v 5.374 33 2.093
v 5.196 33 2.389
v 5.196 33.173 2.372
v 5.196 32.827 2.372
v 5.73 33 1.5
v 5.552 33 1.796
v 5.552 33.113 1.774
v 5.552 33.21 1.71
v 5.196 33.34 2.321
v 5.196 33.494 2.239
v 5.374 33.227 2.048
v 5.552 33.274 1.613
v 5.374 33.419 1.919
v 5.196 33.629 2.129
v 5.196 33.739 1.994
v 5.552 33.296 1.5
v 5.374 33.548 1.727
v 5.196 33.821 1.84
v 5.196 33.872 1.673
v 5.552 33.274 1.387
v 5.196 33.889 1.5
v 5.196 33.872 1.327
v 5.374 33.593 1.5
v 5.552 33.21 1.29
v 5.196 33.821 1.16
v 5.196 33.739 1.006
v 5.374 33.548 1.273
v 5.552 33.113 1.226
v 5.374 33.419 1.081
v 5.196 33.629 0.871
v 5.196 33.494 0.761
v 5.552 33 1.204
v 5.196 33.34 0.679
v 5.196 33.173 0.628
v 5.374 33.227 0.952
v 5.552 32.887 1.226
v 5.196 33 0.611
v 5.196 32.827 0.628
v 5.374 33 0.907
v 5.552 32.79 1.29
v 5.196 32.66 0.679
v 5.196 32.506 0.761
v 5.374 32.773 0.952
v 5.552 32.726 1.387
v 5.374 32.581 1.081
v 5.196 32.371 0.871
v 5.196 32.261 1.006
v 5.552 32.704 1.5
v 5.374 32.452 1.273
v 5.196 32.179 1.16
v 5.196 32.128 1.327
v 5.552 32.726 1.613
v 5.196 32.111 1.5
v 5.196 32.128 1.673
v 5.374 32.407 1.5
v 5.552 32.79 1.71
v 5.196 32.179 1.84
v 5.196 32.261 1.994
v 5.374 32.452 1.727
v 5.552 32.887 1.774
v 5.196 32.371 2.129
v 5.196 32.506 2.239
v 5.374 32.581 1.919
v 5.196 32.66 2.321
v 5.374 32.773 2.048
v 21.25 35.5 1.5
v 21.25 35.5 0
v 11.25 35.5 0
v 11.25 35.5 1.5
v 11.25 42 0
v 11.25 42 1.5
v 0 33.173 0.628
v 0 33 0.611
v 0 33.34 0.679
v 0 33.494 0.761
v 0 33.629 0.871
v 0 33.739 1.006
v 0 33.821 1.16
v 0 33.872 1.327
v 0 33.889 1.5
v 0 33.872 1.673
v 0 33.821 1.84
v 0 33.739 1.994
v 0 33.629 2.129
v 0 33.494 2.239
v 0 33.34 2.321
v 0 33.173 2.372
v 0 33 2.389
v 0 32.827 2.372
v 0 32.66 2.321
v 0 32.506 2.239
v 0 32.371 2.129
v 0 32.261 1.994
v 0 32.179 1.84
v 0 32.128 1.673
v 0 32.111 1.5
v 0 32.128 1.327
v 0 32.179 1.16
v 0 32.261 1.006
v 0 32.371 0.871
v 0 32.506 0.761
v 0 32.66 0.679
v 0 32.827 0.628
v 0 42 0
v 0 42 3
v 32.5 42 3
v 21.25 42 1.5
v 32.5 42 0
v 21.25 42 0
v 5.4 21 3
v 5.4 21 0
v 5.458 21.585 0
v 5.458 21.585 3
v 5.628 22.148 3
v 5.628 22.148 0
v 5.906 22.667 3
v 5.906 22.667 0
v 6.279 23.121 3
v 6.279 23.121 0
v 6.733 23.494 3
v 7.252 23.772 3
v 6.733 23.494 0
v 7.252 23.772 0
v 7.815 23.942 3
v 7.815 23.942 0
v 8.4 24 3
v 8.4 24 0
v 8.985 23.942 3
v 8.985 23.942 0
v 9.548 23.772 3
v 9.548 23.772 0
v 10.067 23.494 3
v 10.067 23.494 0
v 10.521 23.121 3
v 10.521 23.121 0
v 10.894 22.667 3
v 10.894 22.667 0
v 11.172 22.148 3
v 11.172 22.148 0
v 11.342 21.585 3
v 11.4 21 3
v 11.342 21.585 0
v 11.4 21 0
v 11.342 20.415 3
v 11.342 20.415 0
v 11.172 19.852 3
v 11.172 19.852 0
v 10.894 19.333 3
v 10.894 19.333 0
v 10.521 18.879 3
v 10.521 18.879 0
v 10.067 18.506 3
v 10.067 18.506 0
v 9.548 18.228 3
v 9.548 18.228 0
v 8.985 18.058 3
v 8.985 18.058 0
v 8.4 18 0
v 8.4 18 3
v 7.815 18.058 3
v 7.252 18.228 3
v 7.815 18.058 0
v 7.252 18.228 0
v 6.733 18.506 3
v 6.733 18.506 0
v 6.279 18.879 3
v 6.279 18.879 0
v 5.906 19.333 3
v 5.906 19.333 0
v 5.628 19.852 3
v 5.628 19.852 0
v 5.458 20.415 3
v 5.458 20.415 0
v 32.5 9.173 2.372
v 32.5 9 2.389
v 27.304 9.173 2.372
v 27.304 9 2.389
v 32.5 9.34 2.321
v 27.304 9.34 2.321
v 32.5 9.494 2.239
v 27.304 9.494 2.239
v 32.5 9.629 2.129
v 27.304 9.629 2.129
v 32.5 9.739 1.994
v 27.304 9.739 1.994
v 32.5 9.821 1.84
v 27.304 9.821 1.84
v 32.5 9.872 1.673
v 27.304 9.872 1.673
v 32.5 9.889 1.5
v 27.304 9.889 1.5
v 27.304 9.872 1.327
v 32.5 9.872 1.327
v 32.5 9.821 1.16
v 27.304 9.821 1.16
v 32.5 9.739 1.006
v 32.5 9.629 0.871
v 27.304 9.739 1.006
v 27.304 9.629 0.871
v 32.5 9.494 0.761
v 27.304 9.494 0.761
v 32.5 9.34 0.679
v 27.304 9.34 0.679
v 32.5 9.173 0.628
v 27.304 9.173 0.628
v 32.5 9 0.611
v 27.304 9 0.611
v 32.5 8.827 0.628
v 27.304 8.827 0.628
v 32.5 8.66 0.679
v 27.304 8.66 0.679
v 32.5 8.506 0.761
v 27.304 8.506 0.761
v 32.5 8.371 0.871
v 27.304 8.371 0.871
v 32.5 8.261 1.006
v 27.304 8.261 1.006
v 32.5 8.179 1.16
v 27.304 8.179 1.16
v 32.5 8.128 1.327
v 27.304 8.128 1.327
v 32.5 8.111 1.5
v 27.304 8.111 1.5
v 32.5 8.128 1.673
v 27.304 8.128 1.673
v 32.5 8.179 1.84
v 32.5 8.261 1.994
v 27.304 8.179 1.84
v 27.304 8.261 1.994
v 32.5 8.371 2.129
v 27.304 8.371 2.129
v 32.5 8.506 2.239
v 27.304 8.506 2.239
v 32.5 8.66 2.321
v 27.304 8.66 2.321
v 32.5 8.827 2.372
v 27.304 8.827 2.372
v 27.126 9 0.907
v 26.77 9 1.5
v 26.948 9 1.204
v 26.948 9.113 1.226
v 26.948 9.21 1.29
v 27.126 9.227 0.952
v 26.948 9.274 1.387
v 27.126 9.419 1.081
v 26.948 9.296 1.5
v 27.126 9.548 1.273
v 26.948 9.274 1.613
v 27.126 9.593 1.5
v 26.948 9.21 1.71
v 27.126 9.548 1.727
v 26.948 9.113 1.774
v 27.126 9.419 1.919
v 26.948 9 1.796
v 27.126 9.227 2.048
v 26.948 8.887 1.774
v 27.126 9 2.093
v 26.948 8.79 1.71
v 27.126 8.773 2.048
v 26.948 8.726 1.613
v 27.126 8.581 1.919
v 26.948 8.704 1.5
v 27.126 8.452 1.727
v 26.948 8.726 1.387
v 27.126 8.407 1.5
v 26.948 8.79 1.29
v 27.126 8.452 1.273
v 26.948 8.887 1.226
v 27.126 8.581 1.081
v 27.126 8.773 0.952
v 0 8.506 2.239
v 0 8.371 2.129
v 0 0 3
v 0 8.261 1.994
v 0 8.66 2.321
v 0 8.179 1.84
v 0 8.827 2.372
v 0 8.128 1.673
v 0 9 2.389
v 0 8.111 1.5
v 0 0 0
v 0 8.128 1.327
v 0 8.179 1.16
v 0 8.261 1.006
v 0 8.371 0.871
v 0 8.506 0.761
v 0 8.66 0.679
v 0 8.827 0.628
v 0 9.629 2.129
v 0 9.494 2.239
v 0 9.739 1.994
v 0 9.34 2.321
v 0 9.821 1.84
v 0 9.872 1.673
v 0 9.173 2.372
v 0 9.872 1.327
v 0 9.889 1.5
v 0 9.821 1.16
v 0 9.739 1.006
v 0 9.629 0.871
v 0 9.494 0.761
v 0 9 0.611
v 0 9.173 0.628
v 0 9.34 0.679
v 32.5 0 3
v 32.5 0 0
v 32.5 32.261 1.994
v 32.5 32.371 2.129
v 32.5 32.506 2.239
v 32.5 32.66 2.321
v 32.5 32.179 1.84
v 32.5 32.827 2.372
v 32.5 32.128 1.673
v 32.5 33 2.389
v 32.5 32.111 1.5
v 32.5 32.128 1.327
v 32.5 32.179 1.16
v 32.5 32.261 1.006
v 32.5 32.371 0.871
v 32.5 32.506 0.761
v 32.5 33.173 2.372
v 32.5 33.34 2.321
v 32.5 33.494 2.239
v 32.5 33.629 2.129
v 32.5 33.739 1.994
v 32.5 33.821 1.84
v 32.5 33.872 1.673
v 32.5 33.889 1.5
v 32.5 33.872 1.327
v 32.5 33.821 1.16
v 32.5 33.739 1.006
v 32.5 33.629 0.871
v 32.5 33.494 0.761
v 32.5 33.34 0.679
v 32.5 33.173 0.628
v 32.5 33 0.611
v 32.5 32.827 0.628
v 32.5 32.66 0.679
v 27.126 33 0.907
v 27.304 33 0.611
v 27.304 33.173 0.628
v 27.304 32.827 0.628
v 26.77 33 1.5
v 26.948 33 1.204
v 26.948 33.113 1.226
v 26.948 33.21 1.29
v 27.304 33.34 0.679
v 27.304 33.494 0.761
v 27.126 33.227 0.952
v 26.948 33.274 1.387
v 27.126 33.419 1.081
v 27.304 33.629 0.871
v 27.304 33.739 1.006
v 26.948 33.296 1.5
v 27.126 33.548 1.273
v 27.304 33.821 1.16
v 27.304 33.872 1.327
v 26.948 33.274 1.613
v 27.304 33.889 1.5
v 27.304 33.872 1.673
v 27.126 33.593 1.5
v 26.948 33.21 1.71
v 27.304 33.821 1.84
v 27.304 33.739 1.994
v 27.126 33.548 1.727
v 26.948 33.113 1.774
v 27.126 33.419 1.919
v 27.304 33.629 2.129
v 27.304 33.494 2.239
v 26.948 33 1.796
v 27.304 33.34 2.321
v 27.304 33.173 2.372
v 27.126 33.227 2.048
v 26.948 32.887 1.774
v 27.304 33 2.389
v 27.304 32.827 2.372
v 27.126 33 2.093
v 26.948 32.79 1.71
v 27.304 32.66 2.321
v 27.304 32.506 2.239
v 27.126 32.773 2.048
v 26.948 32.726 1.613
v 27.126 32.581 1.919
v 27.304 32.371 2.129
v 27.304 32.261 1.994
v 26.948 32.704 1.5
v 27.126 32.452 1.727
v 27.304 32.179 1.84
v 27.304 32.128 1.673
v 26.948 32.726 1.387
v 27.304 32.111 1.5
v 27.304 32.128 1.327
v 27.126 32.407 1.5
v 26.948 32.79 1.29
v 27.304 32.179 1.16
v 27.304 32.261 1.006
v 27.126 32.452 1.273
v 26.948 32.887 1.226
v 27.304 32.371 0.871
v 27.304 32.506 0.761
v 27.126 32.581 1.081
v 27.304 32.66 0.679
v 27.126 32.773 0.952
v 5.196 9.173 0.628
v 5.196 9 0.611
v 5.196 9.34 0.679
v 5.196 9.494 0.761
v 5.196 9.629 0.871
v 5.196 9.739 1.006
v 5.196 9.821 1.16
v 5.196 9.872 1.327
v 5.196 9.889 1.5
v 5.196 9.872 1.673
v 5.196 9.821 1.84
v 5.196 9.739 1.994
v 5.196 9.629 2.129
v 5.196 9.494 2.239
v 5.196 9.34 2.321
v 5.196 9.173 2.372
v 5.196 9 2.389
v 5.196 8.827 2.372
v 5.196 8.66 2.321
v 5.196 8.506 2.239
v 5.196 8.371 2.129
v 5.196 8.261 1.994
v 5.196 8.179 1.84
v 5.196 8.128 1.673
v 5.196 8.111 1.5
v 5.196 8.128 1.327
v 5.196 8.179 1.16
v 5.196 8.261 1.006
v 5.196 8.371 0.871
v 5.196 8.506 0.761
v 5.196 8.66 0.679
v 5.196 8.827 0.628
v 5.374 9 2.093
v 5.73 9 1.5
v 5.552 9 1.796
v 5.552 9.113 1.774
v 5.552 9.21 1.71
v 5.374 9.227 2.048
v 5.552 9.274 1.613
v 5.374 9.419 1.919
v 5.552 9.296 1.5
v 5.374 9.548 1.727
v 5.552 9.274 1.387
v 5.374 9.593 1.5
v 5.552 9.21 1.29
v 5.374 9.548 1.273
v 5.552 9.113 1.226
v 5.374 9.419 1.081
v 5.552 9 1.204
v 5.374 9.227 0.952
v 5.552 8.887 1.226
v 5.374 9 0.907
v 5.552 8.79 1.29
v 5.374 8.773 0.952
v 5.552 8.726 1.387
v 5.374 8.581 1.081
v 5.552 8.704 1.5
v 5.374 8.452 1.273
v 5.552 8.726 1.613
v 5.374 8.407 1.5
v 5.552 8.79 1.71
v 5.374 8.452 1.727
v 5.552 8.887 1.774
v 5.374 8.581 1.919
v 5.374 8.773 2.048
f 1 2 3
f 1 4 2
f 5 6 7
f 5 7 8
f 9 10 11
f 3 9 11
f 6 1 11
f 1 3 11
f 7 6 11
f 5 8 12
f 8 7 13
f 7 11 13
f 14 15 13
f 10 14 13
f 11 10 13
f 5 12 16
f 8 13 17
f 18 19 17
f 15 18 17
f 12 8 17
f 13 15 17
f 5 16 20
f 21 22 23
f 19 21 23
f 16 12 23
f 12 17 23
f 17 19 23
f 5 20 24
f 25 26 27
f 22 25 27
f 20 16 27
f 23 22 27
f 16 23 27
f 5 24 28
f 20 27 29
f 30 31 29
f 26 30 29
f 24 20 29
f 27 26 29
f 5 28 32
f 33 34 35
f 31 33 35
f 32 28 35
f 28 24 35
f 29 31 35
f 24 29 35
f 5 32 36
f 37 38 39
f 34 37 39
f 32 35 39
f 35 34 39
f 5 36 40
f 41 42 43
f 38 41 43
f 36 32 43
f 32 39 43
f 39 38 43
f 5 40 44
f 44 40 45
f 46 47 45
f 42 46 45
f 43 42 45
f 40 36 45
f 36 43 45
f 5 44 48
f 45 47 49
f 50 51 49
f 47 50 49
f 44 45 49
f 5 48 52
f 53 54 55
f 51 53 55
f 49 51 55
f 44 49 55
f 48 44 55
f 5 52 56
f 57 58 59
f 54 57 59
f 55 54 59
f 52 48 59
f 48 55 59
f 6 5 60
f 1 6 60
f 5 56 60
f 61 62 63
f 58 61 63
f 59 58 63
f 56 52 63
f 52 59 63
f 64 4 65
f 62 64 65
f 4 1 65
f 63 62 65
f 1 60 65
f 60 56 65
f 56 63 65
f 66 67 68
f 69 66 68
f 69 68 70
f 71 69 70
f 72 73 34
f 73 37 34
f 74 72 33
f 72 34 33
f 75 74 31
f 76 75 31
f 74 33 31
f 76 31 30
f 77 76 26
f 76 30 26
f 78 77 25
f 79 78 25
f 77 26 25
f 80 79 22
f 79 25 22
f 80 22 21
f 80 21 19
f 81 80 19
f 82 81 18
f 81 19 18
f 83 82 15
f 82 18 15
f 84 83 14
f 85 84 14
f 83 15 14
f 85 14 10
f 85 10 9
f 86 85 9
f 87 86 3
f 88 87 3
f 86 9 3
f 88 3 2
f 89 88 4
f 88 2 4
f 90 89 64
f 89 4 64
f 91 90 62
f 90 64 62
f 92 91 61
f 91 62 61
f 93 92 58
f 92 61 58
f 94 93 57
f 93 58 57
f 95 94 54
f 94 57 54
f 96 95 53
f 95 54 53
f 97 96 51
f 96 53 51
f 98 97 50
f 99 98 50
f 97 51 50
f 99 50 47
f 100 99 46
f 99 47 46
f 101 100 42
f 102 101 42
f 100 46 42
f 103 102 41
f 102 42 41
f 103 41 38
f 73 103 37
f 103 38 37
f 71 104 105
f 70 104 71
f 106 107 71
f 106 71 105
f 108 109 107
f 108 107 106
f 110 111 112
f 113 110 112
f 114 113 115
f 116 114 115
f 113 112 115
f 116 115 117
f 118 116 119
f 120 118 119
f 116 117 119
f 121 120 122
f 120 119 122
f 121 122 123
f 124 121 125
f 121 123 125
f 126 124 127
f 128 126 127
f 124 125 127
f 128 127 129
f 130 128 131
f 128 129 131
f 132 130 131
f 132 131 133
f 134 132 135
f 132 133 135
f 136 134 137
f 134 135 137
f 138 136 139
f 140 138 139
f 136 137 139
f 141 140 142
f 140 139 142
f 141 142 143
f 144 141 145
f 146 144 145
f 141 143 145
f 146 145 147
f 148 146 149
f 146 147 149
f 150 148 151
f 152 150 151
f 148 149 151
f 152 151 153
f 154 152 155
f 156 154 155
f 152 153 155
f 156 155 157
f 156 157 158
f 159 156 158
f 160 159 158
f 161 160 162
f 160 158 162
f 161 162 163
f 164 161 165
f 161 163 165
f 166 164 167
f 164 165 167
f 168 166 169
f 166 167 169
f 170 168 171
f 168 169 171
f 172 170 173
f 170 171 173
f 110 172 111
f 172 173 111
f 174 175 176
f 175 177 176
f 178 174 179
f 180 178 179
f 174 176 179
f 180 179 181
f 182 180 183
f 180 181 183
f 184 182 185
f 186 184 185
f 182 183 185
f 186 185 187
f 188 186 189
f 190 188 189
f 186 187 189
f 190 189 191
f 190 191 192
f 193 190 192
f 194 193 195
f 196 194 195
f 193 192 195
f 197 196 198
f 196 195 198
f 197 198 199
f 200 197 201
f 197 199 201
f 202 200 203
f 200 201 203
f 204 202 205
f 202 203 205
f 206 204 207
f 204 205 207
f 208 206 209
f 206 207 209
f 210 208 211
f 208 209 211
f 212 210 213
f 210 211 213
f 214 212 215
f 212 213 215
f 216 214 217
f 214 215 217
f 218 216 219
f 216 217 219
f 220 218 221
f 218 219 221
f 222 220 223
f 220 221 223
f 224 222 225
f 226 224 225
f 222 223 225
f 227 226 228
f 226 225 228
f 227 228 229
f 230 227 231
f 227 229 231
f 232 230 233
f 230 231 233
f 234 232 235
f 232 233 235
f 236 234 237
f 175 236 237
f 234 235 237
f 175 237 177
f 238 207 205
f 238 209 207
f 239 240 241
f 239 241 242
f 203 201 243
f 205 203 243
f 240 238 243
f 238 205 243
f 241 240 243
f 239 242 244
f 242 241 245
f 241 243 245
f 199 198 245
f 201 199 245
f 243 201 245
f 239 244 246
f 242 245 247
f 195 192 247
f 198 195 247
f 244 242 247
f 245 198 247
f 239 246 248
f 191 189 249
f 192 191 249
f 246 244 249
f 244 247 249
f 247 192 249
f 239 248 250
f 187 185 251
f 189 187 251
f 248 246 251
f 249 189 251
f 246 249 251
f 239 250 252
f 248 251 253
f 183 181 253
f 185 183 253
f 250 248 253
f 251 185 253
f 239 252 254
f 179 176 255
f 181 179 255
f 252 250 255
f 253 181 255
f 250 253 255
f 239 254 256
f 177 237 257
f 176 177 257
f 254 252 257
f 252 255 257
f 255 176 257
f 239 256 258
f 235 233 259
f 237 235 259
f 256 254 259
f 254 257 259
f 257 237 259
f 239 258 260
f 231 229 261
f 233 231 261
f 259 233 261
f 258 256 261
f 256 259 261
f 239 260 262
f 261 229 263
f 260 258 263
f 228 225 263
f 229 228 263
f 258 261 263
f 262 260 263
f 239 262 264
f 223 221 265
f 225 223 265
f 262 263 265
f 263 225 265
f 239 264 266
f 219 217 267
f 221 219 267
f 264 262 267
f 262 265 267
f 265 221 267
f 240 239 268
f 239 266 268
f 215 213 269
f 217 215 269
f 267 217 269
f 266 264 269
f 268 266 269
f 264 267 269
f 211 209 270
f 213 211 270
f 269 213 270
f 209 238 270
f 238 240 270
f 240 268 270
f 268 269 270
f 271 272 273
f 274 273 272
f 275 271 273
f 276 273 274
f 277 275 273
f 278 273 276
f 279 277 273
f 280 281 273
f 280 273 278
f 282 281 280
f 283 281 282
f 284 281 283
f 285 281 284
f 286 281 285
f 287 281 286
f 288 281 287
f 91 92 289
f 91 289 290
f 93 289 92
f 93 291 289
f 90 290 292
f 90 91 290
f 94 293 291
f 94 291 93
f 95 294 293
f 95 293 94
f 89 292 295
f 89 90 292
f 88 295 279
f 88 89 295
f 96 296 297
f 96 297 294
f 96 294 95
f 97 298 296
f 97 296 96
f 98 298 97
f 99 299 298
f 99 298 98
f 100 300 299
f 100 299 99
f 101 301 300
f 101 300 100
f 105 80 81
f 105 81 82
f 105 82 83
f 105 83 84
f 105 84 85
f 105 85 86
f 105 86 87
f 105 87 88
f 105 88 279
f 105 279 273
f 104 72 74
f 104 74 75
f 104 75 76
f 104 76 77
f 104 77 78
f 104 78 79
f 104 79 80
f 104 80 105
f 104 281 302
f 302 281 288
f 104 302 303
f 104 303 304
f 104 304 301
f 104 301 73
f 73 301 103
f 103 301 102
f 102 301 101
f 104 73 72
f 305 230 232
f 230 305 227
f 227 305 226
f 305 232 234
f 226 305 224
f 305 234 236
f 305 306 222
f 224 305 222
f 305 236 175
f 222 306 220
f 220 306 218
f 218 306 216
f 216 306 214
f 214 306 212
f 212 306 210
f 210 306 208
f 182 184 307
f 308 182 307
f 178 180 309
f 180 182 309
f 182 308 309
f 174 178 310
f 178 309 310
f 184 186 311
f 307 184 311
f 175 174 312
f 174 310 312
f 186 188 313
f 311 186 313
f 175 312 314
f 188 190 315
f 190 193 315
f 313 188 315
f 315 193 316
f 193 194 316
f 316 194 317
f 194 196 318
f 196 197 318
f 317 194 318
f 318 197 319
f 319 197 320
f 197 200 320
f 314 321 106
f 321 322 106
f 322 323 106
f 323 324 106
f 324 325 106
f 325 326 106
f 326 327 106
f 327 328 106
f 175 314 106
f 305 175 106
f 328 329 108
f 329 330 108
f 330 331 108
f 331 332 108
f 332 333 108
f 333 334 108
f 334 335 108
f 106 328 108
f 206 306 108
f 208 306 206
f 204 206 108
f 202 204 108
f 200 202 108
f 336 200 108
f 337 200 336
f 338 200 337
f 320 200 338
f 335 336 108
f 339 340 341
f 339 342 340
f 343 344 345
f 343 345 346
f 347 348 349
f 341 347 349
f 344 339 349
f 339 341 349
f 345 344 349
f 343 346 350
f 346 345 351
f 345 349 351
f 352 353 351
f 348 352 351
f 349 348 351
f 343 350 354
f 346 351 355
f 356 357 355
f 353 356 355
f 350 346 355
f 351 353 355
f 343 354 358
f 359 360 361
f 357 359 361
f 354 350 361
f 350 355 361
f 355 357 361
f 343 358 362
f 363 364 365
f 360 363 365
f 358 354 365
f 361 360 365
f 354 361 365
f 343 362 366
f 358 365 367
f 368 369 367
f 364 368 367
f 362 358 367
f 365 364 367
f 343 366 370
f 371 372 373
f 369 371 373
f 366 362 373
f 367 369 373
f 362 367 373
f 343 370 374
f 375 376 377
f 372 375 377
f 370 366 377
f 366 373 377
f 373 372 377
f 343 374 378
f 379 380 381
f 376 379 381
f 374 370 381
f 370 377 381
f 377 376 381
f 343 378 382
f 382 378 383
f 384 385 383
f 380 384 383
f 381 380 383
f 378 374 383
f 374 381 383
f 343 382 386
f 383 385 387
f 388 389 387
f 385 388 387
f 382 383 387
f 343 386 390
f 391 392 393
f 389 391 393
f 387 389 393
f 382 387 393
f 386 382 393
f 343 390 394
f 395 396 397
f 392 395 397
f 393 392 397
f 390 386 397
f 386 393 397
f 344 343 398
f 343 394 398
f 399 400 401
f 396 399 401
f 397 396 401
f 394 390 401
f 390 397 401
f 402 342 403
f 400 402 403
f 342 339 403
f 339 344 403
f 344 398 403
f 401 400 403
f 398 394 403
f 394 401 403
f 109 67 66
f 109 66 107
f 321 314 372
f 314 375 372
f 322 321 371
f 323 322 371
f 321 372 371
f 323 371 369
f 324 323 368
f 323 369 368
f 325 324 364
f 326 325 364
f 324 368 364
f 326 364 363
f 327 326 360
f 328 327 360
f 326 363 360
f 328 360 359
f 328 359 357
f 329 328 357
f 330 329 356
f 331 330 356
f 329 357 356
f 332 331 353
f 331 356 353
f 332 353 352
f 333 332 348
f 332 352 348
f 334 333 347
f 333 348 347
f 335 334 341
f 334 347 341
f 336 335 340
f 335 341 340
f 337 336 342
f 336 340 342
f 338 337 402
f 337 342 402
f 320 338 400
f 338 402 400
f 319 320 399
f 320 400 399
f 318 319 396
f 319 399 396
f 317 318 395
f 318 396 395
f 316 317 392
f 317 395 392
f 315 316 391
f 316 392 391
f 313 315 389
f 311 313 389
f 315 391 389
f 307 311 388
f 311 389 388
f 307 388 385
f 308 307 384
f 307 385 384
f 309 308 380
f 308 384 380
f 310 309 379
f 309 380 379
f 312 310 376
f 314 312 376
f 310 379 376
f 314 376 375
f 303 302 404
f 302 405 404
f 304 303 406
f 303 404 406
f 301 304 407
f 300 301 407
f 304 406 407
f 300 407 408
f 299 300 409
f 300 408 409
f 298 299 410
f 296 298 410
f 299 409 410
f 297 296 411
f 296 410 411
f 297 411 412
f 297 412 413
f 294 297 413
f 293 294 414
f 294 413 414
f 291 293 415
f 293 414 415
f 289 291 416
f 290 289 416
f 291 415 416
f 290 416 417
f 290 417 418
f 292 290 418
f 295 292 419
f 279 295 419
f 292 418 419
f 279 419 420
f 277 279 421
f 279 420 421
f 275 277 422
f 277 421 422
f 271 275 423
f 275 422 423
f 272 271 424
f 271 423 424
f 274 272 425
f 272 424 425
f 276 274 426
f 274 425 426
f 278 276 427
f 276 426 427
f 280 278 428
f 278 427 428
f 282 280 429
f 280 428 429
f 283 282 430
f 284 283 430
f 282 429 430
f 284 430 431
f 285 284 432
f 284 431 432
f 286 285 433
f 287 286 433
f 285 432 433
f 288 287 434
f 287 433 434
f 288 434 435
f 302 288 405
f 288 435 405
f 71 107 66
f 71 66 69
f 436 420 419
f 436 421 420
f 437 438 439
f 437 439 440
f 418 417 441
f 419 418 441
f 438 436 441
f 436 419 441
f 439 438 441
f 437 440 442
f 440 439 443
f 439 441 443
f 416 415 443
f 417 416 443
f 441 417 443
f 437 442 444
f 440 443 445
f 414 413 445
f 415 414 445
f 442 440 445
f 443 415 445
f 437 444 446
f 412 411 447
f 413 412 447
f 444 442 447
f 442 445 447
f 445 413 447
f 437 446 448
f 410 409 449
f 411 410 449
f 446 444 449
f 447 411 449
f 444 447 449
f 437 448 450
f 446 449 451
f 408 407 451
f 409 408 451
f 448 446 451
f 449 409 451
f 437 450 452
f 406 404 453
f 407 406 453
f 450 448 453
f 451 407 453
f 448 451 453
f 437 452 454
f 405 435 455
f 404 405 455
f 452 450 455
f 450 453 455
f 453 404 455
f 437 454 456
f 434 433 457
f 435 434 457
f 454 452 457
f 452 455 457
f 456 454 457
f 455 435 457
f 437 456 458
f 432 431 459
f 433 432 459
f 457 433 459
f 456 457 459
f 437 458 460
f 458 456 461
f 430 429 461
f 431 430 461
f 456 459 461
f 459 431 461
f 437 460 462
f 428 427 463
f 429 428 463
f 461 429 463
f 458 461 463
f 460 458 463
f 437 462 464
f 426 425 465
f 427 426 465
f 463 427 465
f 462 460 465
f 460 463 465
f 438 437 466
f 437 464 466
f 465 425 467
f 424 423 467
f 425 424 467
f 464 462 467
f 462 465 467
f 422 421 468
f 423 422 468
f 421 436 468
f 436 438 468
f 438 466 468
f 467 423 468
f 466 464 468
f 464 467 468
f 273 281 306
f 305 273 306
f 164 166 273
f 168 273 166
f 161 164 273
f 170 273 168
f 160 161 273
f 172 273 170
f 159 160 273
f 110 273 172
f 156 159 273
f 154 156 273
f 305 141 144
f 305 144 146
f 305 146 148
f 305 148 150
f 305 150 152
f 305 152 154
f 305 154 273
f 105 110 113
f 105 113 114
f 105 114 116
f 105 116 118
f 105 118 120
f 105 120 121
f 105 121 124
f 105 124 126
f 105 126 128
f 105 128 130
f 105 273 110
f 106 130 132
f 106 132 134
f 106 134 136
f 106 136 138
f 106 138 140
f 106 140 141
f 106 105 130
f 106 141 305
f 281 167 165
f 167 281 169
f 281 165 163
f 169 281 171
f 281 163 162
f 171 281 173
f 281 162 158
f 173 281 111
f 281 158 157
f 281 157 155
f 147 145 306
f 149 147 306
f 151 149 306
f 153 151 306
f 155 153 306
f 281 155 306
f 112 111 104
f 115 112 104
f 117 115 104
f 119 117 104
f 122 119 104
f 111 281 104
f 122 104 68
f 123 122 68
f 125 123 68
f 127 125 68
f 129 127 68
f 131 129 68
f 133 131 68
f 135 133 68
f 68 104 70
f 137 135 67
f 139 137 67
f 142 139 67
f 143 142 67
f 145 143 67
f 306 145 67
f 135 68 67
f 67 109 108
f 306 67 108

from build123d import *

# Parameters (mm, degrees)
SKETCH1_W                 = 32.5
SKETCH1_H                 = 42
BOSS_EXTRUDE2_DEPTH       = 3
F_2_56_TAPPED_HOLE1_D     = 1.778
F_2_56_TAPPED_HOLE1_DEPTH = 5.19583491
F_2_56_TAPPED_HOLE1_TIP   = 0.53416509
F_2_56_TAPPED_HOLE2_D     = 1.778
F_2_56_TAPPED_HOLE2_DEPTH = 5.19583491
F_2_56_TAPPED_HOLE2_TIP   = 0.53416509
CUT_EXTRUDE1_DEPTH        = 3
SKETCH10_W                = 10
SKETCH10_H                = 6.5
CUT_EXTRUDE2_DEPTH        = 1.5


with BuildPart() as part:
    # Sketch1 → Boss-Extrude2 (new body)
    with BuildSketch(Plane.XY):
        with Locations((16.25, 21)):
            Rectangle(SKETCH1_W, SKETCH1_H)
    extrude(amount=BOSS_EXTRUDE2_DEPTH)

    # #2-56 Tapped Hole1
    with Locations(Plane.ZY):
        with Locations((1.5, 33), (1.5, 9)):
            Hole(F_2_56_TAPPED_HOLE1_D / 2, depth=F_2_56_TAPPED_HOLE1_DEPTH)
            with Locations((0, 0, -(F_2_56_TAPPED_HOLE1_DEPTH + F_2_56_TAPPED_HOLE1_TIP / 2))):  # 118° drill point
                Cone(0, F_2_56_TAPPED_HOLE1_D / 2, F_2_56_TAPPED_HOLE1_TIP, mode=Mode.SUBTRACT)

    # #2-56 Tapped Hole2
    with Locations(Plane(origin=(32.5, 0, 0), x_dir=(0, 0, -1), z_dir=(1, 0, 0))):
        with Locations((-1.5, 33), (-1.5, 9)):
            Hole(F_2_56_TAPPED_HOLE2_D / 2, depth=F_2_56_TAPPED_HOLE2_DEPTH)
            with Locations((0, 0, -(F_2_56_TAPPED_HOLE2_DEPTH + F_2_56_TAPPED_HOLE2_TIP / 2))):  # 118° drill point
                Cone(0, F_2_56_TAPPED_HOLE2_D / 2, F_2_56_TAPPED_HOLE2_TIP, mode=Mode.SUBTRACT)

    # Sketch9 → Cut-Extrude1 (cut)
    with BuildSketch(Plane(origin=(0, 0, 0), x_dir=(-1, 0, 0), z_dir=(0, 0, -1))):
        with BuildLine():
            ThreePointArc((-11.4, 21), (-8.4, 18), (-5.4, 21))
            Line((-5.4, 21), (-8.4, 21))
            Line((-8.4, 21), (-11.4, 21))
        make_face()
        with BuildLine():
            Line((-8.4, 21), (-5.4, 21))
            ThreePointArc((-5.4, 21), (-8.4, 24), (-11.4, 21))
            Line((-11.4, 21), (-8.4, 21))
        make_face()
    extrude(amount=-CUT_EXTRUDE1_DEPTH, mode=Mode.SUBTRACT)

    # Sketch10 → Cut-Extrude2 (cut)
    with BuildSketch(Plane(origin=(0, 0, 0), x_dir=(-1, 0, 0), z_dir=(0, 0, -1))):
        with Locations((-16.25, 38.75)):
            Rectangle(SKETCH10_W, SKETCH10_H)
    extrude(amount=-CUT_EXTRUDE2_DEPTH, mode=Mode.SUBTRACT)


solid = part.part
